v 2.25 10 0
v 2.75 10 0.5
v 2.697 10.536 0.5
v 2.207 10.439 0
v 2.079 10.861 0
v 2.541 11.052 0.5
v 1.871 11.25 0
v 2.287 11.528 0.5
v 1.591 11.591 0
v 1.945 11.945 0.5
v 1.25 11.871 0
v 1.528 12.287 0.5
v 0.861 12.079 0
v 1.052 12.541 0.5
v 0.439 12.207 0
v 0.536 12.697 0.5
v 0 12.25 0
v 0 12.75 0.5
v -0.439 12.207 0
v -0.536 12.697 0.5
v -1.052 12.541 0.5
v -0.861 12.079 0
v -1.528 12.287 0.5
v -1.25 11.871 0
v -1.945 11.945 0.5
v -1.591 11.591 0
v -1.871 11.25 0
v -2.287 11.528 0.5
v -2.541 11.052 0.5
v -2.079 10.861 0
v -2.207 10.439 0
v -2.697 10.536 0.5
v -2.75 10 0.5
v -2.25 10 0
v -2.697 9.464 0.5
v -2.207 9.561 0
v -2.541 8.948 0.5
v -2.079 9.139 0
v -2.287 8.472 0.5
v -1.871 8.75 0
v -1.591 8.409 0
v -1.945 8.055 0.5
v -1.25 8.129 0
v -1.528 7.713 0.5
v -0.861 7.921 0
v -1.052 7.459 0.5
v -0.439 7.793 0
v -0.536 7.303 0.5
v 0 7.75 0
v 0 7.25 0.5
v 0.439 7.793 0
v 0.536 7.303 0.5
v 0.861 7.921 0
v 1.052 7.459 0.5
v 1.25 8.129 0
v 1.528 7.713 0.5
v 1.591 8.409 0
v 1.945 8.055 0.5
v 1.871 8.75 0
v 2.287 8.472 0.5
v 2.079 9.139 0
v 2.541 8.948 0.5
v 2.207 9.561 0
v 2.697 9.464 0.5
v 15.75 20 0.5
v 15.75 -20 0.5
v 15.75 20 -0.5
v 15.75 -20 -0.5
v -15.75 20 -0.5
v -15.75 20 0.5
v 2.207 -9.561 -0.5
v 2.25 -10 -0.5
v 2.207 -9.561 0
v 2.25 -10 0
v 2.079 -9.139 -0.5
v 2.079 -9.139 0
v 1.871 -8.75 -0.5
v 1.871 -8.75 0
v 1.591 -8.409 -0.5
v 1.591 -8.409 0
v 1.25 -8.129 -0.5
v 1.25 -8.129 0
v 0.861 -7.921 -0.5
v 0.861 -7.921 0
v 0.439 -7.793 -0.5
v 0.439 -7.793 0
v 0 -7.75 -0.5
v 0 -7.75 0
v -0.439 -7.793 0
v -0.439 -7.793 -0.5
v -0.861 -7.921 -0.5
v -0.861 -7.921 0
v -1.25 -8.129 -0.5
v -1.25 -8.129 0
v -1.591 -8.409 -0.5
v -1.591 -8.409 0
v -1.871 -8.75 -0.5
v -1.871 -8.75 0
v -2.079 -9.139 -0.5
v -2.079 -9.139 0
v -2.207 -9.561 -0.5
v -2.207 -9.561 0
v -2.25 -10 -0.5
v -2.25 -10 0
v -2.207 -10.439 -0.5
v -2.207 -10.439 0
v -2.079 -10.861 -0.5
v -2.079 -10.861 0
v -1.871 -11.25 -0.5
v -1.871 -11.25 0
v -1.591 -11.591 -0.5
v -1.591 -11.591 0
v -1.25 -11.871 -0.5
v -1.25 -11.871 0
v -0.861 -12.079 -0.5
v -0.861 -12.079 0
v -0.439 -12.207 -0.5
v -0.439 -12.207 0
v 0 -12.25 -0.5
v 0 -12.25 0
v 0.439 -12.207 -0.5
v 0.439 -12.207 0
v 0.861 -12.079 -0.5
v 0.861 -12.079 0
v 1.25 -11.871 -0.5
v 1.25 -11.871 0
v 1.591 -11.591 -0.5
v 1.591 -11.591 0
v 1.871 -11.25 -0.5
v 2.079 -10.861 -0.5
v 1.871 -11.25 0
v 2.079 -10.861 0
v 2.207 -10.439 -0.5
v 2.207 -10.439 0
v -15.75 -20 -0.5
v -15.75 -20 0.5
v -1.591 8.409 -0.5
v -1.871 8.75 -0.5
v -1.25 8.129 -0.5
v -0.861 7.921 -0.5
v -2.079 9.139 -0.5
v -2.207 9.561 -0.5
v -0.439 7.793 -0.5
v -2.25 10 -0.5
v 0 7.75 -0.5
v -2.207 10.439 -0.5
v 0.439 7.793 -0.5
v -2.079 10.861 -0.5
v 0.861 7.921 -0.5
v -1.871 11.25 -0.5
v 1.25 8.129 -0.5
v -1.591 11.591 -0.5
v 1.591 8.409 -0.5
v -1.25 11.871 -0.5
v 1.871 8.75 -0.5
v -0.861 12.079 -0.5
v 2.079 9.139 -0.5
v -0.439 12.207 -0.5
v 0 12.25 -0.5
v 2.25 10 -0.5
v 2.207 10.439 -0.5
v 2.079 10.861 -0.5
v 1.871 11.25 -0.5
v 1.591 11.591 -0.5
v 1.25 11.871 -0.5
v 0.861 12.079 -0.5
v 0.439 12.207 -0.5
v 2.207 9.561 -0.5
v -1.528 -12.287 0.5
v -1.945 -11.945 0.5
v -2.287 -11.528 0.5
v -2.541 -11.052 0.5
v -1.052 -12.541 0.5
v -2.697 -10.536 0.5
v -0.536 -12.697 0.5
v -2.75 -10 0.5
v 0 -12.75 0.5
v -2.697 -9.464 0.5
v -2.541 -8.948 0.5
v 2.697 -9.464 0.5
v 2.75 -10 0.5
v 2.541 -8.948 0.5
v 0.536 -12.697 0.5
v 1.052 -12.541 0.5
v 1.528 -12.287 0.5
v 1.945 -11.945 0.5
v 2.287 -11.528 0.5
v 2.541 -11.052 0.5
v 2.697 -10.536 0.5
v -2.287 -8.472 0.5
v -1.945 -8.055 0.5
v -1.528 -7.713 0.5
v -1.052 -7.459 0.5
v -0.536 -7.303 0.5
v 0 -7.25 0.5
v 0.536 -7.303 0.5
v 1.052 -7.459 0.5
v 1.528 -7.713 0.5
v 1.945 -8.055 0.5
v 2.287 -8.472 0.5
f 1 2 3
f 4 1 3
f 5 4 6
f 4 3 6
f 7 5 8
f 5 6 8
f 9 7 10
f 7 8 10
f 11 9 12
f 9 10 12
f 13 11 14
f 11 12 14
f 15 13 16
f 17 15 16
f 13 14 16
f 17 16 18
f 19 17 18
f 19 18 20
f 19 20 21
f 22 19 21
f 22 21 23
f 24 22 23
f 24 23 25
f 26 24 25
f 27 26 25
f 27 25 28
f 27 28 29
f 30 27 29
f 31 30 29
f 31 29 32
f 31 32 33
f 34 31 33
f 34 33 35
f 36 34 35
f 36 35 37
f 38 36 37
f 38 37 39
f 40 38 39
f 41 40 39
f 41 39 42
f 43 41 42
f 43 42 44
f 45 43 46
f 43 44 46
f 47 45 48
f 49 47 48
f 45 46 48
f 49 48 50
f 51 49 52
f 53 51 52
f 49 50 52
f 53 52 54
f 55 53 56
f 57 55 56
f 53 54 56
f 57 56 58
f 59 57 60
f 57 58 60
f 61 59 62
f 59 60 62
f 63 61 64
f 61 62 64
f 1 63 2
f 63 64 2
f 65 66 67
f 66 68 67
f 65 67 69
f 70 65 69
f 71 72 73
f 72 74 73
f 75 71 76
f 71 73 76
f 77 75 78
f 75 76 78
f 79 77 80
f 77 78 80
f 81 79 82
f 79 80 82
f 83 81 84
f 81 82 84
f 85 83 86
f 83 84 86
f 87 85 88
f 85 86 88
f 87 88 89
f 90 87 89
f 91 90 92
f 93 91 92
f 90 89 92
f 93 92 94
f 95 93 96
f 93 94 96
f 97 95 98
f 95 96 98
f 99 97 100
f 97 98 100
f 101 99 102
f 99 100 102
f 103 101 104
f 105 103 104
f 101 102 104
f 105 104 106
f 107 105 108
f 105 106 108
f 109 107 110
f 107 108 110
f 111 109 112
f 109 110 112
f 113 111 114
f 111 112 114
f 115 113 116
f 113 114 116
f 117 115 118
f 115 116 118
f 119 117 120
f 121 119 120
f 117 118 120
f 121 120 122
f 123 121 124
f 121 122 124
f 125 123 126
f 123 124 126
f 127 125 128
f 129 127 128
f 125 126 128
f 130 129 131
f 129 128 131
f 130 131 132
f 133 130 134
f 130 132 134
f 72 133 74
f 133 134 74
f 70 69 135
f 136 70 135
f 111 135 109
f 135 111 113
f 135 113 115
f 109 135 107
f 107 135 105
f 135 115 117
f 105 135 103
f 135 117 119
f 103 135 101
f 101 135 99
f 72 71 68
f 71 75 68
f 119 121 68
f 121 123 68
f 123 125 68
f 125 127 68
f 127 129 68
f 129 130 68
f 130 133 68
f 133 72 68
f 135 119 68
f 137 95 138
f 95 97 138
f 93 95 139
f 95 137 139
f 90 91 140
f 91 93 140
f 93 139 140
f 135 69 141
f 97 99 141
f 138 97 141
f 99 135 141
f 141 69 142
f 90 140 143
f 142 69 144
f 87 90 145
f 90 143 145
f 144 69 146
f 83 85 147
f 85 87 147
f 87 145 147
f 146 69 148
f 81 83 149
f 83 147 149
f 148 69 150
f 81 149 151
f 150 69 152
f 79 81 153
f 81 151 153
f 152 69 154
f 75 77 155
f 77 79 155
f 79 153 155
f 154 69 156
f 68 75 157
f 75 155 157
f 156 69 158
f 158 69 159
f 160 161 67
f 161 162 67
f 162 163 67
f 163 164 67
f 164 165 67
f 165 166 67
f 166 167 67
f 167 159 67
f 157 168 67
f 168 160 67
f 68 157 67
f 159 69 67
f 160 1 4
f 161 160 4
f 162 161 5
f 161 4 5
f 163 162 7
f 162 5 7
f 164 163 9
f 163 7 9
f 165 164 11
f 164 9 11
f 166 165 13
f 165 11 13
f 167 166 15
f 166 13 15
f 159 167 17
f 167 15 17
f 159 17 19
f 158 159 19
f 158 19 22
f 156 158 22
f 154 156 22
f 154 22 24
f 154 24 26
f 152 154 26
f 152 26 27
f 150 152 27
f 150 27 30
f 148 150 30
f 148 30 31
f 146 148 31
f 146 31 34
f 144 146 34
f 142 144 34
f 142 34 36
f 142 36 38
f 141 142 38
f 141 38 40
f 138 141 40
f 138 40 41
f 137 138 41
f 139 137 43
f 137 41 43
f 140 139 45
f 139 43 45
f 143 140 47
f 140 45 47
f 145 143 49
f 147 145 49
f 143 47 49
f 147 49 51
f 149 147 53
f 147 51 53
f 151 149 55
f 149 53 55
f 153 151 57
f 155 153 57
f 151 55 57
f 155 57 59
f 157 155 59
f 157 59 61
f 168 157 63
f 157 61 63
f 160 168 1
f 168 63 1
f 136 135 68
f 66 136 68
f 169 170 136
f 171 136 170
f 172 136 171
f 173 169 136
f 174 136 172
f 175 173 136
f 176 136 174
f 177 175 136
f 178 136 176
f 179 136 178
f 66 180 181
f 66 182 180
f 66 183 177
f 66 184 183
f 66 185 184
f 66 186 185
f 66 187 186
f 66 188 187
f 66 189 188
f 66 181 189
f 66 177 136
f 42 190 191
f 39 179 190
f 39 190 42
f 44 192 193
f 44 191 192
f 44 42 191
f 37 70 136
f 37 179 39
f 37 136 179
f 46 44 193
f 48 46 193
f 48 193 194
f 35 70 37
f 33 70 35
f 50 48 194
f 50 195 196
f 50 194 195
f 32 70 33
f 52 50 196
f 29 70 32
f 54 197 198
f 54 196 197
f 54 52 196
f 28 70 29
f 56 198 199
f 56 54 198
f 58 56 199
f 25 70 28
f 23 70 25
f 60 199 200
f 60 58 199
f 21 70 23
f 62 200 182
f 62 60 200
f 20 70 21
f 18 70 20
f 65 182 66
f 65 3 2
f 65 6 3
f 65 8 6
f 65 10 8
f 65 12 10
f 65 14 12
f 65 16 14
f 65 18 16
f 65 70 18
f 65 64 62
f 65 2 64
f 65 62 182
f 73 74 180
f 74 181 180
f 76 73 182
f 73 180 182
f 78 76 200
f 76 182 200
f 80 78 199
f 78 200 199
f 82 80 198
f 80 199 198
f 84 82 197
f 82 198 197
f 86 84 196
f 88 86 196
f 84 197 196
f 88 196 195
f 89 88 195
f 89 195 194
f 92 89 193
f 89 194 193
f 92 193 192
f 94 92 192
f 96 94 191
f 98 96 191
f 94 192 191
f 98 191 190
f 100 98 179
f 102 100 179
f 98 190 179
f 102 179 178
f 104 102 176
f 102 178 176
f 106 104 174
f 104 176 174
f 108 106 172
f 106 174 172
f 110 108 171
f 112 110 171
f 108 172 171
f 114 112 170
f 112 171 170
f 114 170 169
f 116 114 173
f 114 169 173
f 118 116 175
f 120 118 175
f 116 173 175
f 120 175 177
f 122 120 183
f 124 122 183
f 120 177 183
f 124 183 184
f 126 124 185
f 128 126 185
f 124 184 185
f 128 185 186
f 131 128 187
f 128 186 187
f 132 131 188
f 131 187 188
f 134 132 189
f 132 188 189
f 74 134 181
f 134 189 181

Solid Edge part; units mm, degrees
sketch "Sketch1" plane through (0, 0, 0) normal (0, 0, 1) x (1, 0, 0)
  line L0 (-15.75, -20) -> (15.75, -20)
  line L1 (15.75, -20) -> (15.75, 20)
  line L2 (15.75, 20) -> (-15.75, 20)
  line L3 (-15.75, 20) -> (-15.75, -20)
  dimension "D1" = 31.5
  dimension "D2" = 40
extrude "Protrusion1" add sketch "Sketch1" along normal mid plane 1
sketch "Sketch2" plane through (0, 0, 0.5) normal (0, 0, 1) x (1, 0, 0)
  circle A0 centre (0, 10) radius 2.25
  circle A1 centre (0, -10) radius 2.25
  dimension "D1" = 10
  dimension "D2" = 20
  dimension "D3" = 4.5
extrude "Cutout1" cut sketch "Sketch2" against normal through all
chamfer "Chamfer_1" distance 0.5 angle 45 2 edges at (-2.25, 10, 0.5) (-2.25, -10, 0.5)
properties material "Polyethylene, low density"
